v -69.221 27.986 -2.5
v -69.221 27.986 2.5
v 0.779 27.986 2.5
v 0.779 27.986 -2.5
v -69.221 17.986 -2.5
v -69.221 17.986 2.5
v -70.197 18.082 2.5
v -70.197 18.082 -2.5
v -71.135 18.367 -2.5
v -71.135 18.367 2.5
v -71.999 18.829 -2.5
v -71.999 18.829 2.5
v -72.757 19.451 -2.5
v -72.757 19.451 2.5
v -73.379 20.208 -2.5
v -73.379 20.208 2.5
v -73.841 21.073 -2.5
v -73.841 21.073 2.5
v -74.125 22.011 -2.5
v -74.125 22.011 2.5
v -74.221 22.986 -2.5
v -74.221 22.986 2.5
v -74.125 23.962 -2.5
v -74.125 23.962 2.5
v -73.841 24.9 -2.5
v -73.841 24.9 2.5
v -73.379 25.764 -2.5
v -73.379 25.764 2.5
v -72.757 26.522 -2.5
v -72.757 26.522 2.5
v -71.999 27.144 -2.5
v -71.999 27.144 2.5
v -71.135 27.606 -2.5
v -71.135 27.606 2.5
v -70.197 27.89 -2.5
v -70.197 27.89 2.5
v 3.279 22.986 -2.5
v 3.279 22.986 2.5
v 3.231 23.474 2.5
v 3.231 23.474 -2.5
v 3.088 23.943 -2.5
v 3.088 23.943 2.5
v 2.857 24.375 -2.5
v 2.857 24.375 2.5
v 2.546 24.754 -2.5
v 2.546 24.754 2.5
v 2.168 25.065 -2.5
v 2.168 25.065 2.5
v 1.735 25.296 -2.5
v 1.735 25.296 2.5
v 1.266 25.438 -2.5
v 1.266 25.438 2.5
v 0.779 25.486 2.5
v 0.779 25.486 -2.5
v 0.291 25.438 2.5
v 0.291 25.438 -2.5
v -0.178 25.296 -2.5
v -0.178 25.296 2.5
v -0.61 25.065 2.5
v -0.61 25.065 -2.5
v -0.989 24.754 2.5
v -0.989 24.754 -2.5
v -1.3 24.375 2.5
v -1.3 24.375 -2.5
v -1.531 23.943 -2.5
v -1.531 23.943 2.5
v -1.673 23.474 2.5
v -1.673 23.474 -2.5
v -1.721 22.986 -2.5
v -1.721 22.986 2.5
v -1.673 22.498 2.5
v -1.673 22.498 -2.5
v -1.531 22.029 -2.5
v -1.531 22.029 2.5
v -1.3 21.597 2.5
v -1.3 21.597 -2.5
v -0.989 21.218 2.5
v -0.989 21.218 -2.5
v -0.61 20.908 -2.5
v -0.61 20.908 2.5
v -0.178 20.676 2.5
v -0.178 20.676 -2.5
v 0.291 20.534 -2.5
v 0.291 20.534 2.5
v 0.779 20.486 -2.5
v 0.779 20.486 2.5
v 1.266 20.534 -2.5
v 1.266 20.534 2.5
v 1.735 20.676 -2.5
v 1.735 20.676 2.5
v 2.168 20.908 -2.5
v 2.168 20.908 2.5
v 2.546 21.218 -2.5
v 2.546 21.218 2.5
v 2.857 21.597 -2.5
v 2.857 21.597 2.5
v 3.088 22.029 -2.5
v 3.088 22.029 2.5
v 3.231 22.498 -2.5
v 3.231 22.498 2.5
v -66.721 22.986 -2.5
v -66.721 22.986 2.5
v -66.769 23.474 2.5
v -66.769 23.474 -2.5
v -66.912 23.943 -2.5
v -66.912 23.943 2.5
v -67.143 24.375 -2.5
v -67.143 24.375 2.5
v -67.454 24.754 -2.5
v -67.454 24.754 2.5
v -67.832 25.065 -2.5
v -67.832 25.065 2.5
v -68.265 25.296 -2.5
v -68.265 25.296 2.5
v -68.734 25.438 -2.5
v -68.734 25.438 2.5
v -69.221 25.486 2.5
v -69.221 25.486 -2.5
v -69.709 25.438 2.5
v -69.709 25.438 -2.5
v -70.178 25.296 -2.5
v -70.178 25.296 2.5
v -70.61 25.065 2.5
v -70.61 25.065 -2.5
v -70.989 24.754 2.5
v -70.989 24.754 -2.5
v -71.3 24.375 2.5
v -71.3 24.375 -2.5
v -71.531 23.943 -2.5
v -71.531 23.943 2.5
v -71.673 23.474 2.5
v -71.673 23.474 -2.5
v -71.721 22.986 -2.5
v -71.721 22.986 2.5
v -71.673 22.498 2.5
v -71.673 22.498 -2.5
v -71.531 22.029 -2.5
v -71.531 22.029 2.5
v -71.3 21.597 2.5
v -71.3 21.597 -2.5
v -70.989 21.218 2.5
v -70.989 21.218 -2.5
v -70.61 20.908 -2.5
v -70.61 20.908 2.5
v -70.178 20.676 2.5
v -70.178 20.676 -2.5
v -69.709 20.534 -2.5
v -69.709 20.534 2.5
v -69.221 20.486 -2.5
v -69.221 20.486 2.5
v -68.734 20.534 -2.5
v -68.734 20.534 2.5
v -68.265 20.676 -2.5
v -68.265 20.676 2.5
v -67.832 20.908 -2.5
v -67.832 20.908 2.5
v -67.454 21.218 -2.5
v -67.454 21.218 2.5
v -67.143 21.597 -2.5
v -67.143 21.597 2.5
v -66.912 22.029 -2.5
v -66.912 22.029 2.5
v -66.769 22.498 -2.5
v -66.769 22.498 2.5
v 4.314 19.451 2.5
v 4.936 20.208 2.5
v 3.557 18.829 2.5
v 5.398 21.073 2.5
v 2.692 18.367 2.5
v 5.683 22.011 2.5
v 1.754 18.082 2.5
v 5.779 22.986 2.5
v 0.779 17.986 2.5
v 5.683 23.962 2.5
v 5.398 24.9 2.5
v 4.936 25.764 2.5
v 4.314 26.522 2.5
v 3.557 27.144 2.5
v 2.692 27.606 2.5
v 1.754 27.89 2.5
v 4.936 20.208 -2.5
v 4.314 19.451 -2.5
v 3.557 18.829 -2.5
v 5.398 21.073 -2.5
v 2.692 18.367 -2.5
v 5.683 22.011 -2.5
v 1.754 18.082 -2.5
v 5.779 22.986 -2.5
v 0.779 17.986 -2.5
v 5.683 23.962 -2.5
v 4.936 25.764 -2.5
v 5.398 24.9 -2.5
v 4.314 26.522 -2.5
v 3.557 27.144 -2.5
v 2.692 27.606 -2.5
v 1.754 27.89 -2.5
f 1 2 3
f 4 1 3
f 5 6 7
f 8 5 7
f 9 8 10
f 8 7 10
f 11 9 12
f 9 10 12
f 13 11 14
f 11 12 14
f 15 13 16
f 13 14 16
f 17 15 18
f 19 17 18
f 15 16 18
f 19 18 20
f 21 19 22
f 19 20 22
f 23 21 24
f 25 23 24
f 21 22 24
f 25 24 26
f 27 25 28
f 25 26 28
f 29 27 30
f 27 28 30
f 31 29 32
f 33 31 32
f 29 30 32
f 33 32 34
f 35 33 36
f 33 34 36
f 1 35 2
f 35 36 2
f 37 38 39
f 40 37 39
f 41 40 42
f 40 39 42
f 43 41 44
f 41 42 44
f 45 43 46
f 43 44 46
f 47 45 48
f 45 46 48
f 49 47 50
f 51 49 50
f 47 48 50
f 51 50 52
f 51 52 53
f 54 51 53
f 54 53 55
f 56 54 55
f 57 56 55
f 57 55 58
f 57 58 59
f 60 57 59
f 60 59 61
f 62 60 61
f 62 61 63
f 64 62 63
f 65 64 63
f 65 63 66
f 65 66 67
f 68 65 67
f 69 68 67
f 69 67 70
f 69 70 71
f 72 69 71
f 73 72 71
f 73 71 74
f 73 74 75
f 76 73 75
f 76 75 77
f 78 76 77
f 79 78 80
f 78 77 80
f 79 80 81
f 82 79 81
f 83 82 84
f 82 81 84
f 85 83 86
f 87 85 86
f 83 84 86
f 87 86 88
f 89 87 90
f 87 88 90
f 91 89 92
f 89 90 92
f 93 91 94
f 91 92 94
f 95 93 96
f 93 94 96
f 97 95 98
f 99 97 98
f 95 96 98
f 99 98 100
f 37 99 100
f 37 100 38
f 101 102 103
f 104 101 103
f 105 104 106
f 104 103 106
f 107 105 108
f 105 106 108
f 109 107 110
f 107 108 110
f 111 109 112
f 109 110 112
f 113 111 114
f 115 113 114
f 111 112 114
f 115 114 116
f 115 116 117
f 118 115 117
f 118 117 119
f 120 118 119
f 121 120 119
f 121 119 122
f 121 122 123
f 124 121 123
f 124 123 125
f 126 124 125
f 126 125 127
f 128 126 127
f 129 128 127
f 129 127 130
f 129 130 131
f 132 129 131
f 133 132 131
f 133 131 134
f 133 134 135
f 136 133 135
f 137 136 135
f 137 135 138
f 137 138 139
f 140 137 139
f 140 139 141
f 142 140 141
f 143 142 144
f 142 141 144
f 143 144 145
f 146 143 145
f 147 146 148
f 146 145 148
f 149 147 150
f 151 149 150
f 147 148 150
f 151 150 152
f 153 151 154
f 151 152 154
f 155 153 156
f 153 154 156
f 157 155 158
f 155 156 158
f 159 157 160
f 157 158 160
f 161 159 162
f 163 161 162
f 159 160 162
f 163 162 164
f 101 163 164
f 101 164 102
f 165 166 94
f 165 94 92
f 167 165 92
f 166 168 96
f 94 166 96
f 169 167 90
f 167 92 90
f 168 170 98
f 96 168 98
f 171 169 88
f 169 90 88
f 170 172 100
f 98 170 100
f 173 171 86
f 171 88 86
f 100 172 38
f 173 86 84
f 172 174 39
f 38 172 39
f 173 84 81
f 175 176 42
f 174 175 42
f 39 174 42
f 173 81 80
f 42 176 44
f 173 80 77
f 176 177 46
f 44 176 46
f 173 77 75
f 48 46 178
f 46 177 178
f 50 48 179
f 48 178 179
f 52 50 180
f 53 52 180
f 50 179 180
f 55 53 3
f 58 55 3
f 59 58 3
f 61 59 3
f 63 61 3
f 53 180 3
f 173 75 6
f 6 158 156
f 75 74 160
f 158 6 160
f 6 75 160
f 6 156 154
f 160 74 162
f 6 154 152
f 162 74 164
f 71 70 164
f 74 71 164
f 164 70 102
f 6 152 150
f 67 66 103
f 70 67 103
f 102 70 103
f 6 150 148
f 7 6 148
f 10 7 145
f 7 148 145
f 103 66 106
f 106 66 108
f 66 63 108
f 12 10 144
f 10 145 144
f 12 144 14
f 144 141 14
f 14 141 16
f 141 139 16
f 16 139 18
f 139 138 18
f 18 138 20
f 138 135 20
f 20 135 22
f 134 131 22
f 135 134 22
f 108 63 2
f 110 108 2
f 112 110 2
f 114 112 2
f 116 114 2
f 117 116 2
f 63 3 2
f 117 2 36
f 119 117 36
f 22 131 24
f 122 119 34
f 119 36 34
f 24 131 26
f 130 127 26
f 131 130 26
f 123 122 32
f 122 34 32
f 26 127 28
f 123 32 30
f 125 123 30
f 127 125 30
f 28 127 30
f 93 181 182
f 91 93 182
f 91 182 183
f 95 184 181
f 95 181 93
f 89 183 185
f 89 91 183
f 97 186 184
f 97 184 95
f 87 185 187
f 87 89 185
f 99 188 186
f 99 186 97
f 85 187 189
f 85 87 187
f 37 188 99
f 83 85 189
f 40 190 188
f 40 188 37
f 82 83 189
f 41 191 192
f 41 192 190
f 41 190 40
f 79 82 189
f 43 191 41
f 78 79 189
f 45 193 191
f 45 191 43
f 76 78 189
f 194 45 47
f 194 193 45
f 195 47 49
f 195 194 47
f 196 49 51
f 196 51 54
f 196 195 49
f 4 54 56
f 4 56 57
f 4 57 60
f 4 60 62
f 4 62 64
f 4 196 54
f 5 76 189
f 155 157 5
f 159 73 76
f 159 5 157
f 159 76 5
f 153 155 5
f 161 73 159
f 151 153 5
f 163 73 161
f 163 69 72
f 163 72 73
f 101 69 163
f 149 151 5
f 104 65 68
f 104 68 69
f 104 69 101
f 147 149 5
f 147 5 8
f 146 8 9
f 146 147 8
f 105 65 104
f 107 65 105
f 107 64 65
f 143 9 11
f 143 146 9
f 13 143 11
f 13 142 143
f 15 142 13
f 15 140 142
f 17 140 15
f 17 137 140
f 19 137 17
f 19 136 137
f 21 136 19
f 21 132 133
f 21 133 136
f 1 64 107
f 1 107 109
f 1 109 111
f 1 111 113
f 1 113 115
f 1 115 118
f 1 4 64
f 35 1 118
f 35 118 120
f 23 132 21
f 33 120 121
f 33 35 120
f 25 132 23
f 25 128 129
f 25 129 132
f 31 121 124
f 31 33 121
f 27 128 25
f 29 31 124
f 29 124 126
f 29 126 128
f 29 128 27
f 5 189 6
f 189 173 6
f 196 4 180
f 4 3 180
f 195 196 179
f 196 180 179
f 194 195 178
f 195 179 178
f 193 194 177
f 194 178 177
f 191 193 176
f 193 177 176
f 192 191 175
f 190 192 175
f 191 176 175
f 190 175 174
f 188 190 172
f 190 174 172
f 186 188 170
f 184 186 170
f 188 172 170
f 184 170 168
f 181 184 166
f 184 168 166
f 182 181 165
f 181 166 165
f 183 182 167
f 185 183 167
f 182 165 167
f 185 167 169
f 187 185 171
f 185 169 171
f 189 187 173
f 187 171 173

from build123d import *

# Parameters (mm, degrees)
EXTRUDE_1_DEPTH     = 2.5
SKETCH_3_R          = 2.5
CUT_EXTRUDE_2_DEPTH = 8
SKETCH_5_R          = 2.5
CUT_EXTRUDE_4_DEPTH = 8


with BuildPart() as part:
    # 草图1 → 凸台-拉伸1 (new, symmetric)
    with BuildSketch(Plane.XY):
        with BuildLine():
            Line((-69.221317243, 27.986194726), (0.778682757, 27.986194726))
            ThreePointArc((0.778682757, 27.986194726), (5.778682757, 22.986194726), (0.778682757, 17.986194726))
            Line((0.778682757, 17.986194726), (-69.221317243, 17.986194726))
            ThreePointArc((-69.221317243, 17.986194726), (-74.221317243, 22.986194726), (-69.221317243, 27.986194726))
        make_face()
    extrude(amount=EXTRUDE_1_DEPTH, both=True)

    # 草图3 → 切除-拉伸2 (cut)
    with BuildSketch(Plane.XY.offset(2.5)):
        with Locations((-69.221317243, 22.986194726)):
            Circle(SKETCH_3_R)
    extrude(amount=-CUT_EXTRUDE_2_DEPTH, mode=Mode.SUBTRACT)

    # 草图5 → 切除-拉伸4 (cut)
    with BuildSketch(Plane.XY.offset(2.5)):
        with Locations((0.778682757, 22.986194726)):
            Circle(SKETCH_5_R)
    extrude(amount=-CUT_EXTRUDE_4_DEPTH, mode=Mode.SUBTRACT)


solid = part.part
